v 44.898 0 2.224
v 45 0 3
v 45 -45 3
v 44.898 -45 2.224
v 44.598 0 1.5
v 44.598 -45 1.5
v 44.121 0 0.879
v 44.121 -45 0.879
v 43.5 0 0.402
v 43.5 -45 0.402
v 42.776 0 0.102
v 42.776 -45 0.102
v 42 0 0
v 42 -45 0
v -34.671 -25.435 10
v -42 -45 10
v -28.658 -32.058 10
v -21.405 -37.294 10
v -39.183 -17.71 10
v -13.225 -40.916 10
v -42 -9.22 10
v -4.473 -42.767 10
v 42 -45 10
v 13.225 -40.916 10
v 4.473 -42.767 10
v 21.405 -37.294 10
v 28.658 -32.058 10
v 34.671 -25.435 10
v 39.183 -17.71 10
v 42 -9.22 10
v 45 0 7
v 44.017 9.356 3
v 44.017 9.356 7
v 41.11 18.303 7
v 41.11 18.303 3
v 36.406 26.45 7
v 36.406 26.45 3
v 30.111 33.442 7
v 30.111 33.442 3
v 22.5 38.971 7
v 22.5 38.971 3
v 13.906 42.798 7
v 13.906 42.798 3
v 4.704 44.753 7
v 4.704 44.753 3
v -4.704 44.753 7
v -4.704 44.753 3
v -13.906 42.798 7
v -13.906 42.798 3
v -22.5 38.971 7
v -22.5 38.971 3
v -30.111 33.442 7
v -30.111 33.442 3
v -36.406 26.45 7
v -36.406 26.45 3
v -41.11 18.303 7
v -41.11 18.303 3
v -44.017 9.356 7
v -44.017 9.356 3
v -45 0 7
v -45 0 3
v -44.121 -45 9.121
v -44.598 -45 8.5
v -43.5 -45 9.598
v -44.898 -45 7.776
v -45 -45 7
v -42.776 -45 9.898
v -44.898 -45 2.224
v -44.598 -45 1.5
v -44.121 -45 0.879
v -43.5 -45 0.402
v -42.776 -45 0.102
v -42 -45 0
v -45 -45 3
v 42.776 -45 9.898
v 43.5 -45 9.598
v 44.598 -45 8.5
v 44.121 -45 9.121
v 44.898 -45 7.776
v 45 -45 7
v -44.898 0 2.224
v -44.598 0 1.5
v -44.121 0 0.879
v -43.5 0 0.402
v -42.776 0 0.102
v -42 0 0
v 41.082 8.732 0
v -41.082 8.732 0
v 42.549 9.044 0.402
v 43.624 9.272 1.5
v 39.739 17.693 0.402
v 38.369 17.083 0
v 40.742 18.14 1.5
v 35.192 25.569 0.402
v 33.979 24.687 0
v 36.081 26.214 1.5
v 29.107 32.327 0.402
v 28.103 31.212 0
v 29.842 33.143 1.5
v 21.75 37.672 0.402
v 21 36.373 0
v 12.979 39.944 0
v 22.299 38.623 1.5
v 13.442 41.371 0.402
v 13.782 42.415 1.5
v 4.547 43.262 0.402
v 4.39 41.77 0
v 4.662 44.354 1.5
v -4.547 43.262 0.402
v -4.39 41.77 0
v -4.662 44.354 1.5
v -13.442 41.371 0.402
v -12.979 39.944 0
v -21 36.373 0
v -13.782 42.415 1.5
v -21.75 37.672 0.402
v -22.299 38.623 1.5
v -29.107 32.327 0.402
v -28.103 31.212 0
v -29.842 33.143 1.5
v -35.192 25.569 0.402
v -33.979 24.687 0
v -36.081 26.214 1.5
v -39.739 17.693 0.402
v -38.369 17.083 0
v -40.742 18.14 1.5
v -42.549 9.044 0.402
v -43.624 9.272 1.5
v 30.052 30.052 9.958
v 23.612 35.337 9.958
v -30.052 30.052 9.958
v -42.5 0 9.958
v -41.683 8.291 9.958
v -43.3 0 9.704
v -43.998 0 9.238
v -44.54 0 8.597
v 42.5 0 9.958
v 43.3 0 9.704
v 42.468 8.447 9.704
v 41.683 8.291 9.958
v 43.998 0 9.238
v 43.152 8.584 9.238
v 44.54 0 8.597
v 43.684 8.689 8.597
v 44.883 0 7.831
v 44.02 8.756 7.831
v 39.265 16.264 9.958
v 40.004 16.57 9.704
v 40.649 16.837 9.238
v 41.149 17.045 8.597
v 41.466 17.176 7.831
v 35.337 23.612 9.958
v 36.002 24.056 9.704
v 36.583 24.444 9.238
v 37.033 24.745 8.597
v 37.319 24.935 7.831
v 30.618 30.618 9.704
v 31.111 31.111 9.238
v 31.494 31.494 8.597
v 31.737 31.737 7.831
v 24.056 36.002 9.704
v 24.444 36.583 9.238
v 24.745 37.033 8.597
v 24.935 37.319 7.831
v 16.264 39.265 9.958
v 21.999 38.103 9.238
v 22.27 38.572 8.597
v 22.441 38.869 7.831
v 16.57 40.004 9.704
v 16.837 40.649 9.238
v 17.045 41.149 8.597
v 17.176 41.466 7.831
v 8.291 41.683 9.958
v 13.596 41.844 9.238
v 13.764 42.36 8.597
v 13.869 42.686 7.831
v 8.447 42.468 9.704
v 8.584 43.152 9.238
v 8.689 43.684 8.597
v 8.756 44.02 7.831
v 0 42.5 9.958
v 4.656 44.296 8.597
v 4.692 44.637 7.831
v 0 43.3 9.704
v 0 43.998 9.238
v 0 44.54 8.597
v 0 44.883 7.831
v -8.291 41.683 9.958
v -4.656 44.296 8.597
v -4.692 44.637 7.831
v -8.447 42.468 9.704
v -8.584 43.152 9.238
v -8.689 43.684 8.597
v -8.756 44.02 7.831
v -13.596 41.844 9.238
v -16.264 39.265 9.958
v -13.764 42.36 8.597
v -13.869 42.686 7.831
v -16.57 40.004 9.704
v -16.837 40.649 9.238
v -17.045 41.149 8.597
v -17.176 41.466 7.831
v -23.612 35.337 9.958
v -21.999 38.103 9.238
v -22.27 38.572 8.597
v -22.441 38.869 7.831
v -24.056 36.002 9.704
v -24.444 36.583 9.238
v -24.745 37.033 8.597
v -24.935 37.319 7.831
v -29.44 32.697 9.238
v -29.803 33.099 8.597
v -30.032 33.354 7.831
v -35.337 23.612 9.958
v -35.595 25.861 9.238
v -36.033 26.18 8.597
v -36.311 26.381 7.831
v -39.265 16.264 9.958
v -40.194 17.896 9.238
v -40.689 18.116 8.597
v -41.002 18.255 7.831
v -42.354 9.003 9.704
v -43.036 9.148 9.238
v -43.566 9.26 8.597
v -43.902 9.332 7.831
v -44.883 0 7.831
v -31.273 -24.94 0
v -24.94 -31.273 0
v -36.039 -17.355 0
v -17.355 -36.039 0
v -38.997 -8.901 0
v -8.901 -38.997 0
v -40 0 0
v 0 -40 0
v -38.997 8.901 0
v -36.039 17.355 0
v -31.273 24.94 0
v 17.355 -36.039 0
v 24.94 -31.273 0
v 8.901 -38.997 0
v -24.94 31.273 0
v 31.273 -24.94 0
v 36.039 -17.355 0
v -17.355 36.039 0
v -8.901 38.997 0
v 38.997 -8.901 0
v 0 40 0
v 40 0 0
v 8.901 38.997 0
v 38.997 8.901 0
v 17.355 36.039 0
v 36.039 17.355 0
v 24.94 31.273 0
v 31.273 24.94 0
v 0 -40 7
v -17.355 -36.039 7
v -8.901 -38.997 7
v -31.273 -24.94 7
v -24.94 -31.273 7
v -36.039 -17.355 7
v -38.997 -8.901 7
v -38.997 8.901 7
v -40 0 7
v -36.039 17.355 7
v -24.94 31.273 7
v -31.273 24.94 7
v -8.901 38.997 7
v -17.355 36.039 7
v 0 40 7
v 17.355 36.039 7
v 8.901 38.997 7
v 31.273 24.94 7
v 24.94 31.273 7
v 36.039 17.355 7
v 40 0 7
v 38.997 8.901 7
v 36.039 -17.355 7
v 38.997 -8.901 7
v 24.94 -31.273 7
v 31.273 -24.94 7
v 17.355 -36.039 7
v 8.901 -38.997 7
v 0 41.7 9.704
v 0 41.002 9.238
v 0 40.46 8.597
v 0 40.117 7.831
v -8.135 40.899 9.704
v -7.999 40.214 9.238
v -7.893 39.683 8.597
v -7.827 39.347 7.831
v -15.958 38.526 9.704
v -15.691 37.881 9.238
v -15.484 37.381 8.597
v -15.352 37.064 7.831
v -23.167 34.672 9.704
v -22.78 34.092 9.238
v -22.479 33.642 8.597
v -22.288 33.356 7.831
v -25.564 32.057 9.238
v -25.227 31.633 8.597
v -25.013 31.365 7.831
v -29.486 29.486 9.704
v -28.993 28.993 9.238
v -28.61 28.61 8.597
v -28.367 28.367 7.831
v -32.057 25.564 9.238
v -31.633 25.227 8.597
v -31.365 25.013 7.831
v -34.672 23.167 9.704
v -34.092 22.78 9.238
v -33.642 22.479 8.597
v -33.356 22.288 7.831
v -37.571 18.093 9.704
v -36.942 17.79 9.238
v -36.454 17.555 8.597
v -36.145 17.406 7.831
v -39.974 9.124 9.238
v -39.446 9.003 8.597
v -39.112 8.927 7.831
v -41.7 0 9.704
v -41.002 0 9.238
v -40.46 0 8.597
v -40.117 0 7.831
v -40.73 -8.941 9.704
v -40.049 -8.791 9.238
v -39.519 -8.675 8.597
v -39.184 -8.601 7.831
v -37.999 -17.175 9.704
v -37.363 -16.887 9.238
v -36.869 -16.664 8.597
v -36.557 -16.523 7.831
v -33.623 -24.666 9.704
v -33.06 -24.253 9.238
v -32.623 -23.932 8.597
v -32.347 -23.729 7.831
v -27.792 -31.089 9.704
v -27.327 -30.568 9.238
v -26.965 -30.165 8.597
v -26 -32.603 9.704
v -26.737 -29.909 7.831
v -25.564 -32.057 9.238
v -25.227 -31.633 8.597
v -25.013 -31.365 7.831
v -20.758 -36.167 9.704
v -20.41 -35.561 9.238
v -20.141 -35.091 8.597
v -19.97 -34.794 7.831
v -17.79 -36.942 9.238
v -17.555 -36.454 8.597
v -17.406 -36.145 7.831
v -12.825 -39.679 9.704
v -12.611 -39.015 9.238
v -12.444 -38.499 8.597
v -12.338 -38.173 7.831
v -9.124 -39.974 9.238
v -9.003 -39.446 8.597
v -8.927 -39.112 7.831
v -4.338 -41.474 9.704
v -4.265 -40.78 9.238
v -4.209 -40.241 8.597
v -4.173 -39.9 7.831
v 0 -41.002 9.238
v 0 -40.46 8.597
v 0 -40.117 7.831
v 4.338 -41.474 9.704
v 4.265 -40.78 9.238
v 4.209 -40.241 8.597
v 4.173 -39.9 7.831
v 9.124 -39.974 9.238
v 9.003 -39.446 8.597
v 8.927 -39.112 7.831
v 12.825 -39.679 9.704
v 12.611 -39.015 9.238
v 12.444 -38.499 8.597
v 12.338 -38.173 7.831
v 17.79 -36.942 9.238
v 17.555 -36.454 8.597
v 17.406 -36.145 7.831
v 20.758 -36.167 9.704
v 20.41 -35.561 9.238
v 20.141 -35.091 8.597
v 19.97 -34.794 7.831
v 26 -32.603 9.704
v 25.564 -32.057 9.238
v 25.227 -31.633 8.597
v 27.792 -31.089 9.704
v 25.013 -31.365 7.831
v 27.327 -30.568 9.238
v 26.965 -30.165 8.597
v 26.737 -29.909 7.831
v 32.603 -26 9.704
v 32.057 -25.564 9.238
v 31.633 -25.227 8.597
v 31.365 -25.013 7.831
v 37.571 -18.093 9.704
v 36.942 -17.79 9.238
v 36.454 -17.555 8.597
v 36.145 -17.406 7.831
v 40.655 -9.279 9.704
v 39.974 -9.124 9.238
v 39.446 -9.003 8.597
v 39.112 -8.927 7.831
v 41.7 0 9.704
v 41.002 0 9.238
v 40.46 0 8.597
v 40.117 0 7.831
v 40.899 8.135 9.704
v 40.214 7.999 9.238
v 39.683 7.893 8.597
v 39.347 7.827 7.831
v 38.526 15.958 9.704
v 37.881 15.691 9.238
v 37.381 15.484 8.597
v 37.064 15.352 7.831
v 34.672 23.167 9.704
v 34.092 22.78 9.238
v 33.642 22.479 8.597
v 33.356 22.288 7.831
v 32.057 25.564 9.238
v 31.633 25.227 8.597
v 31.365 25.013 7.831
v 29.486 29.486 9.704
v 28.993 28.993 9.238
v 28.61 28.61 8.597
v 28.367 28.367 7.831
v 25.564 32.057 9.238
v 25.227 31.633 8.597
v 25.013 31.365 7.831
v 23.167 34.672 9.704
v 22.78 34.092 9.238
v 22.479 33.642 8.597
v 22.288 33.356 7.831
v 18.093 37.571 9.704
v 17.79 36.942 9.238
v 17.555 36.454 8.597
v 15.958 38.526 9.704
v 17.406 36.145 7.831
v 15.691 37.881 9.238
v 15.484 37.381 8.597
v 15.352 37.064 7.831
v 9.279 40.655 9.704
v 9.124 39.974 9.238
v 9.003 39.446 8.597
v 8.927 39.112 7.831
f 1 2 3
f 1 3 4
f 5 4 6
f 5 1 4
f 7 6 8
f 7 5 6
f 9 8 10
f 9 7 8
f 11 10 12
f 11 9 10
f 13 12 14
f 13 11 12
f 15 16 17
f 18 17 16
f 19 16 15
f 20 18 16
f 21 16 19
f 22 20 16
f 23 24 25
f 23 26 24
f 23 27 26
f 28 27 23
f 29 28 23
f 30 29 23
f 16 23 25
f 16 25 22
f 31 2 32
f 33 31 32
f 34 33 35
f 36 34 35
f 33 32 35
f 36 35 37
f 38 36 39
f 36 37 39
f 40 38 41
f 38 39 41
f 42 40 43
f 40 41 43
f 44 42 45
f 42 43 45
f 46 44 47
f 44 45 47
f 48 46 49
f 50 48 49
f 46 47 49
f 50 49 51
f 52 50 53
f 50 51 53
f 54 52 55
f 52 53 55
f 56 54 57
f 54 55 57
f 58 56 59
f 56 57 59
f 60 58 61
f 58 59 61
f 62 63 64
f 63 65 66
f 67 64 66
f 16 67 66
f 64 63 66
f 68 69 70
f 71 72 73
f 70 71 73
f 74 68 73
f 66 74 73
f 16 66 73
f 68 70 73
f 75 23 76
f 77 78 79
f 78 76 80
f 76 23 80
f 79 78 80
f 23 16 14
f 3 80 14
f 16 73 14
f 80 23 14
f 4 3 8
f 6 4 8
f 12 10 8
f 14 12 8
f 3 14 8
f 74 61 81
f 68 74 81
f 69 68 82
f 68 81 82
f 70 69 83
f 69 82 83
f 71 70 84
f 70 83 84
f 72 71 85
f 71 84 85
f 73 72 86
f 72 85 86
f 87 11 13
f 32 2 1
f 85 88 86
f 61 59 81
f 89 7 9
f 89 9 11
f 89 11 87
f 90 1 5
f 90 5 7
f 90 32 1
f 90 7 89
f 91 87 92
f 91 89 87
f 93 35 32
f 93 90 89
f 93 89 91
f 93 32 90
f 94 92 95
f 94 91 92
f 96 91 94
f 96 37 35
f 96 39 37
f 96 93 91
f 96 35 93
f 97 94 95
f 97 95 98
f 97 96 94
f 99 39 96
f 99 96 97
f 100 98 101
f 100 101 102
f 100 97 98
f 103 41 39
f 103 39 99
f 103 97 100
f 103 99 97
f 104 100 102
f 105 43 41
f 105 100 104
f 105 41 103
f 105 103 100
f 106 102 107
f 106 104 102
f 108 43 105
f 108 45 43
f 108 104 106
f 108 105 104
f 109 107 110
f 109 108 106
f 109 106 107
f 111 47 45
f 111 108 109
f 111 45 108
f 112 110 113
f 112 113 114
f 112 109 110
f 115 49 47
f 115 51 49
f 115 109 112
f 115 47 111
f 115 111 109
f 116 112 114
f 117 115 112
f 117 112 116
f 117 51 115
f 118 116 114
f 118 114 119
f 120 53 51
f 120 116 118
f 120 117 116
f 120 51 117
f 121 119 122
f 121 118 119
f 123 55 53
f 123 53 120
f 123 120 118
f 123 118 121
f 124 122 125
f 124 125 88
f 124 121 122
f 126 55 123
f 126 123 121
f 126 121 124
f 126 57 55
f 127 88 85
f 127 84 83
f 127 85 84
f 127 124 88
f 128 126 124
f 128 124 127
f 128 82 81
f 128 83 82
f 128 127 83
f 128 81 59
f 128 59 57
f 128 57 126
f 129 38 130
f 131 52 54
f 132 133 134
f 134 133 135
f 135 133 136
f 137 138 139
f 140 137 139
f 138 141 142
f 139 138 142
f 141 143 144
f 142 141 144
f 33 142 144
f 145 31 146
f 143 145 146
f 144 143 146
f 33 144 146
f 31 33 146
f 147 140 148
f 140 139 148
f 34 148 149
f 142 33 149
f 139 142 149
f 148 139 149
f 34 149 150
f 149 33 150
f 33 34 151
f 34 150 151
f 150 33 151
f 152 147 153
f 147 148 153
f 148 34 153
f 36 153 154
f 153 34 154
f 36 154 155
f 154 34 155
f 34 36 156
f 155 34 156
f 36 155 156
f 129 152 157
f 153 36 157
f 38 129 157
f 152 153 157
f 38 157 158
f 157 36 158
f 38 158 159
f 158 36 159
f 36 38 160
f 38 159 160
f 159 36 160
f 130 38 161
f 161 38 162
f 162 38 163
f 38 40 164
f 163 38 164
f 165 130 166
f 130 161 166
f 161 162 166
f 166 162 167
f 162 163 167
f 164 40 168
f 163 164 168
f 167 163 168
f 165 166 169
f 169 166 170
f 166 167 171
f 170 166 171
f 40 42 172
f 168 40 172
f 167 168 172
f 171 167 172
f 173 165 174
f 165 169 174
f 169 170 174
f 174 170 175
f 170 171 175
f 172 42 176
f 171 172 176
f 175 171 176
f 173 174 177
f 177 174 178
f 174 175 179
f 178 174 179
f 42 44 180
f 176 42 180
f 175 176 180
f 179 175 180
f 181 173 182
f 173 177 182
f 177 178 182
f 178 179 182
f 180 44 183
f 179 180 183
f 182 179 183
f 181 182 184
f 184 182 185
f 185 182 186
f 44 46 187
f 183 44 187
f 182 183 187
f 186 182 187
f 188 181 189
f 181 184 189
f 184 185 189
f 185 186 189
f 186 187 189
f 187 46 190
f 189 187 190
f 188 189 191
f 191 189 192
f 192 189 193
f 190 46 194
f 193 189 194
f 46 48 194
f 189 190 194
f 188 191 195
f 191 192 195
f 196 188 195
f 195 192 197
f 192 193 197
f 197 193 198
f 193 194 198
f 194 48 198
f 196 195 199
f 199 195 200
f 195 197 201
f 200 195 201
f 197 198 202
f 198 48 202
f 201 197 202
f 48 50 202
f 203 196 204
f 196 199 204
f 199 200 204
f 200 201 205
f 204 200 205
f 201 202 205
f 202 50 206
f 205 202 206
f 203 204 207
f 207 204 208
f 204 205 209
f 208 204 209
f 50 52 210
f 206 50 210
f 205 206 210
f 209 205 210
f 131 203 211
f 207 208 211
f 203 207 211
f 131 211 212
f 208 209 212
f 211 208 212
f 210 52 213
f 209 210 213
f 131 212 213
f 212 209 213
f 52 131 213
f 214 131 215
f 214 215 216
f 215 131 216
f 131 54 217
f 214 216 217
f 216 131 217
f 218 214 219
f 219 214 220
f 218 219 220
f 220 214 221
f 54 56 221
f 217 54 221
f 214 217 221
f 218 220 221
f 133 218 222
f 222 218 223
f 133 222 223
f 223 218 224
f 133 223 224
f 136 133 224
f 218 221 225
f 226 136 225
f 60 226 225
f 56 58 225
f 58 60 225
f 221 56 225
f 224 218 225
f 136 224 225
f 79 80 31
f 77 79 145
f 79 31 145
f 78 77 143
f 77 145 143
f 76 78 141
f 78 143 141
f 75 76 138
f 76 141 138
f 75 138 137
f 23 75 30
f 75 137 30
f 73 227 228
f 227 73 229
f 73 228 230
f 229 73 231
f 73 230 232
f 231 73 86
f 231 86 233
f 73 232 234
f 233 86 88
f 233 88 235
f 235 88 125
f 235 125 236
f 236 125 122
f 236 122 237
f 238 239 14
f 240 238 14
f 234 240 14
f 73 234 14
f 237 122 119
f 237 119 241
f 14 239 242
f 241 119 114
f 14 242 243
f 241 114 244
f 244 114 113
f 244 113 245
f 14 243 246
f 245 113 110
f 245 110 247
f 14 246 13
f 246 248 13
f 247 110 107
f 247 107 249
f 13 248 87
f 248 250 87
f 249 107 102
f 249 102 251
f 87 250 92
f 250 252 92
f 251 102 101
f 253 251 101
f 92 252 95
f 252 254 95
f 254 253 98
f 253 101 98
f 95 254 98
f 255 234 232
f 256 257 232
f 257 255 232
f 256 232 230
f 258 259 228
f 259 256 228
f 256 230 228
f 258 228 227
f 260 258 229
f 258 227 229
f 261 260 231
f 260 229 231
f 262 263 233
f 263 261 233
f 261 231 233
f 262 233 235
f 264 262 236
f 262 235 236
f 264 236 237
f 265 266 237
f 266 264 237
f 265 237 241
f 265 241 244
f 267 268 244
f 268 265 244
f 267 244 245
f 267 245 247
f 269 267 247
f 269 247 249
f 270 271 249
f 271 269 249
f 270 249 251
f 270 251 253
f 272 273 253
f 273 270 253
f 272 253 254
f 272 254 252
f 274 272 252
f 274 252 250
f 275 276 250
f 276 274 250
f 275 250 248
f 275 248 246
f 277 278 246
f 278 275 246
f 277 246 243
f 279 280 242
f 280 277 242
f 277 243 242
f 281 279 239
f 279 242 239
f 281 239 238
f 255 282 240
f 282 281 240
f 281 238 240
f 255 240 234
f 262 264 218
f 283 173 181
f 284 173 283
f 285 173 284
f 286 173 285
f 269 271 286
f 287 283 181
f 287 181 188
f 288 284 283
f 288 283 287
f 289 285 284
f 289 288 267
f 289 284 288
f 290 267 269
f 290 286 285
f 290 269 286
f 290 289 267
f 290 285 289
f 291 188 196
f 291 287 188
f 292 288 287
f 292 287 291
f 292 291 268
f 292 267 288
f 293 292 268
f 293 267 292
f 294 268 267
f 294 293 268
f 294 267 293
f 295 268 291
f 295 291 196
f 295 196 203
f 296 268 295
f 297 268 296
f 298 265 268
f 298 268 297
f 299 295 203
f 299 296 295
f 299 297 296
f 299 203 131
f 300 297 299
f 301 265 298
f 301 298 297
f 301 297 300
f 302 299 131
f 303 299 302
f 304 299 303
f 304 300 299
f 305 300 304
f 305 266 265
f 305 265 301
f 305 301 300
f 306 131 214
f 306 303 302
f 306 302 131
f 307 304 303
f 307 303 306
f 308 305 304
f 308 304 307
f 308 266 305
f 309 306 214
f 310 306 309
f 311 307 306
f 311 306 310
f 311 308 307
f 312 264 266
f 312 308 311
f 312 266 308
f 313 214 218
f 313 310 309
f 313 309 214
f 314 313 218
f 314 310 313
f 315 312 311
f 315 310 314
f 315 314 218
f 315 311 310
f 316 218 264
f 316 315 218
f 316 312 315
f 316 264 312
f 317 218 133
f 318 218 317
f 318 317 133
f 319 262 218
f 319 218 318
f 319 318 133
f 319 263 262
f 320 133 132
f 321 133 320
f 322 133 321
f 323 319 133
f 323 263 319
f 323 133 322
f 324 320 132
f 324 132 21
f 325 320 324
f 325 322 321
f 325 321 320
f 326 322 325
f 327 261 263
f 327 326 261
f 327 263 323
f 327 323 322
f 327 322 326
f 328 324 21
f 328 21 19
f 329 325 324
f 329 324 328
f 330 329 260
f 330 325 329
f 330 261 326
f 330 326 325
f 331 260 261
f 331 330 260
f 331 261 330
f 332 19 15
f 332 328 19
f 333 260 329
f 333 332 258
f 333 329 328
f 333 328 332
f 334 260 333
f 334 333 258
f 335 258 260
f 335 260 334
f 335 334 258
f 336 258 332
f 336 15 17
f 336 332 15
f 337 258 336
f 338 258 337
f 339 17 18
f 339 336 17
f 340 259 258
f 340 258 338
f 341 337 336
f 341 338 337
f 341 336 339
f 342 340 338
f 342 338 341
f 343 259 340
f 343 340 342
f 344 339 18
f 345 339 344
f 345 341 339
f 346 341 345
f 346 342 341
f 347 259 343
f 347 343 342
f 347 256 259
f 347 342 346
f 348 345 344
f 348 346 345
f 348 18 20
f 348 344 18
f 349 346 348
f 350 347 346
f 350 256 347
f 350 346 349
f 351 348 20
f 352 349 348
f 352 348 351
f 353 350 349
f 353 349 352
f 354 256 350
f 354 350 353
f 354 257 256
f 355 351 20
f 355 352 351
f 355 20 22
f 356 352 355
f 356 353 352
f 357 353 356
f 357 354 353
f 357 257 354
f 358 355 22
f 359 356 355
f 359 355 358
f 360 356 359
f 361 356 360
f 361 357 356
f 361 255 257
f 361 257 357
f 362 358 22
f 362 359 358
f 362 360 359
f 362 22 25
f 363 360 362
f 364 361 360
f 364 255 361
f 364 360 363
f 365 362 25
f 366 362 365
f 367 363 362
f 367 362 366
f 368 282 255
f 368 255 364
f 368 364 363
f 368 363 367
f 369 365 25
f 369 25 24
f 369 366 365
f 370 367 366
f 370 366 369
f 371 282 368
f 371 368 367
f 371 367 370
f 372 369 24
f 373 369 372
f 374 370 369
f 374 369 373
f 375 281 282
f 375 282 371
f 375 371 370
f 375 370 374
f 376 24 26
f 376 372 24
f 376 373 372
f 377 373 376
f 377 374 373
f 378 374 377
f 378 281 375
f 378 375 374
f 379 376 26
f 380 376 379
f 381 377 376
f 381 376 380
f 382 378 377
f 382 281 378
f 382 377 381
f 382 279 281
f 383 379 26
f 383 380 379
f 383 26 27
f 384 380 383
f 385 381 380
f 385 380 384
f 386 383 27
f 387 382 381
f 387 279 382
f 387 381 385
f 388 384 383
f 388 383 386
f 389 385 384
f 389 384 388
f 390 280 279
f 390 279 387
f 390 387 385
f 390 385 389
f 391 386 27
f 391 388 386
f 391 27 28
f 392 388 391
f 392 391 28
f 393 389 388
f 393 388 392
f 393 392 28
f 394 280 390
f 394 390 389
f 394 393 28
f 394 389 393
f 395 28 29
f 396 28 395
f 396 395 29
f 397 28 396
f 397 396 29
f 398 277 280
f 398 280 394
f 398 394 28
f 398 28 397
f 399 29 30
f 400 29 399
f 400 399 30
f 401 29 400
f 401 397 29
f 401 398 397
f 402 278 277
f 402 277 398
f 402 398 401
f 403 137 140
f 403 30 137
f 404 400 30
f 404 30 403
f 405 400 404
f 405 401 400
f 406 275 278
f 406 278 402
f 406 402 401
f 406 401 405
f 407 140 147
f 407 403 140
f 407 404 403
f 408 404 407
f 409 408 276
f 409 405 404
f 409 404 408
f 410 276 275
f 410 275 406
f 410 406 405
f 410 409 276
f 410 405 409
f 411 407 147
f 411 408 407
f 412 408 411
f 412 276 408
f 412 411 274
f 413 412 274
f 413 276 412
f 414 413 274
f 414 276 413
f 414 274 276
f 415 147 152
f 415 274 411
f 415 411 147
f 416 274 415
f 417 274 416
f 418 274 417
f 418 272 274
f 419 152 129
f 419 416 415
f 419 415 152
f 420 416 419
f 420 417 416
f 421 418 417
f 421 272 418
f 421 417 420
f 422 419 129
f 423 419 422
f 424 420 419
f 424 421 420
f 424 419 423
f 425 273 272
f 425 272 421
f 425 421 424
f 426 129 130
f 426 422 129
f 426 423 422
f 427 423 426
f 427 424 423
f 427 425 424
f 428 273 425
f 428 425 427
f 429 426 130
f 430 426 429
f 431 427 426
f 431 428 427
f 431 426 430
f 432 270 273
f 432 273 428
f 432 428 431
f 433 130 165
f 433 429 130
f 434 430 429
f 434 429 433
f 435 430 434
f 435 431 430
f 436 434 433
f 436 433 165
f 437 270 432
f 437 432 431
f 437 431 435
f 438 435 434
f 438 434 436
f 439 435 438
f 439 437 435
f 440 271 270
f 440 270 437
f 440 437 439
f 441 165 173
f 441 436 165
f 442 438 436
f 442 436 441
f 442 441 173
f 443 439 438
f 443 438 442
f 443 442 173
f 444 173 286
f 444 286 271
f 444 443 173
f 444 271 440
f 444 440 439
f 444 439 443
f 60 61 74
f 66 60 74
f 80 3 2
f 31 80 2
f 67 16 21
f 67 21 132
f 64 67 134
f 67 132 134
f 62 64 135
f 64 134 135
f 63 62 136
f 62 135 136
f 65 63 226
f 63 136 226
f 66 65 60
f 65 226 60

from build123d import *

# Parameters (mm, degrees)
F1_DEPTH    = 10
F2_T1_DEPTH = 52.5
F2_T6_ANGLE = 180
F2_T8_ANGLE = 180


# Not quite as in the source:
# - a fillet or chamfer that OpenCascade refuses, or shapes differently, is made with other operations: its cross-section is extruded or revolved along the edge and cut away or added


with BuildPart() as f1:
    # F0 (on Top) → F1 (new body)
    with BuildSketch(Plane.XY):
        with BuildLine():
            Line((45, -45), (45, 0))
            ThreePointArc((45, 0), (0, 45), (-45, 0))
            Line((-45, 0), (-45, -45))
            Line((-45, -45), (0, -45))
            Line((0, -45), (45, -45))
        make_face()
        with BuildLine():
            ThreePointArc((0, 40), (40, 0), (0, -40))
            ThreePointArc((0, -40), (-40, 0), (0, 40))
        make_face(mode=Mode.SUBTRACT)
    extrude(amount=F1_DEPTH)

    # F2: fillet of radius 3 on 6 edges, made by hand

    # F2_s2 → F2_t1 (cut)
    with BuildSketch(Plane.XZ):
        with BuildLine():
            ThreePointArc((-42, 10), (-44.1213203436, 9.1213203436), (-45, 7))
            Line((-45, 7), (-45, 10))
            Line((-45, 10), (-42, 10))
        make_face()
        with BuildLine():
            ThreePointArc((-45, 3), (-44.1213203436, 0.8786796564), (-42, 0))
            Line((-42, 0), (-45, 0))
            Line((-45, 0), (-45, 3))
        make_face()
        with BuildLine():
            ThreePointArc((45, 3), (44.1213203436, 0.8786796564), (42, 0))
            Line((42, 0), (45, 0))
            Line((45, 0), (45, 3))
        make_face()
        with BuildLine():
            ThreePointArc((45, 7), (44.1213203436, 9.1213203436), (42, 10))
            Line((42, 10), (45, 10))
            Line((45, 10), (45, 7))
        make_face()
    extrude(amount=F2_T1_DEPTH, mode=Mode.SUBTRACT)

    # F2_s3 → F2_t4 (revolve, cut)
    with BuildSketch(Plane.YZ):
        with BuildLine():
            ThreePointArc((43, 10), (40.8786796564, 9.1213203436), (40, 7))
            Line((40, 7), (40, 10))
            Line((40, 10), (43, 10))
        make_face()
    revolve(axis=Axis((0, 0, 10), (0, 0, 1)), mode=Mode.SUBTRACT)

    # F2_s5 → F2_t6 (revolve, cut)
    with BuildSketch(Plane.XZ):
        with BuildLine():
            ThreePointArc((42, 10), (44.1213203436, 9.1213203436), (45, 7))
            Line((45, 7), (45, 10))
            Line((45, 10), (42, 10))
        make_face()
    revolve(axis=Axis((0, 0, 10), (0, 0, 1)), revolution_arc=F2_T6_ANGLE, mode=Mode.SUBTRACT)

    # F2_s7 → F2_t8 (revolve, cut)
    with BuildSketch(Plane.XZ):
        with BuildLine():
            ThreePointArc((42, 0), (44.1213203436, 0.8786796564), (45, 3))
            Line((45, 3), (45, 0))
            Line((45, 0), (42, 0))
        make_face()
    revolve(axis=Axis((0, 0, 0), (0, 0, 1)), revolution_arc=F2_T8_ANGLE, mode=Mode.SUBTRACT)


solid = f1.part
